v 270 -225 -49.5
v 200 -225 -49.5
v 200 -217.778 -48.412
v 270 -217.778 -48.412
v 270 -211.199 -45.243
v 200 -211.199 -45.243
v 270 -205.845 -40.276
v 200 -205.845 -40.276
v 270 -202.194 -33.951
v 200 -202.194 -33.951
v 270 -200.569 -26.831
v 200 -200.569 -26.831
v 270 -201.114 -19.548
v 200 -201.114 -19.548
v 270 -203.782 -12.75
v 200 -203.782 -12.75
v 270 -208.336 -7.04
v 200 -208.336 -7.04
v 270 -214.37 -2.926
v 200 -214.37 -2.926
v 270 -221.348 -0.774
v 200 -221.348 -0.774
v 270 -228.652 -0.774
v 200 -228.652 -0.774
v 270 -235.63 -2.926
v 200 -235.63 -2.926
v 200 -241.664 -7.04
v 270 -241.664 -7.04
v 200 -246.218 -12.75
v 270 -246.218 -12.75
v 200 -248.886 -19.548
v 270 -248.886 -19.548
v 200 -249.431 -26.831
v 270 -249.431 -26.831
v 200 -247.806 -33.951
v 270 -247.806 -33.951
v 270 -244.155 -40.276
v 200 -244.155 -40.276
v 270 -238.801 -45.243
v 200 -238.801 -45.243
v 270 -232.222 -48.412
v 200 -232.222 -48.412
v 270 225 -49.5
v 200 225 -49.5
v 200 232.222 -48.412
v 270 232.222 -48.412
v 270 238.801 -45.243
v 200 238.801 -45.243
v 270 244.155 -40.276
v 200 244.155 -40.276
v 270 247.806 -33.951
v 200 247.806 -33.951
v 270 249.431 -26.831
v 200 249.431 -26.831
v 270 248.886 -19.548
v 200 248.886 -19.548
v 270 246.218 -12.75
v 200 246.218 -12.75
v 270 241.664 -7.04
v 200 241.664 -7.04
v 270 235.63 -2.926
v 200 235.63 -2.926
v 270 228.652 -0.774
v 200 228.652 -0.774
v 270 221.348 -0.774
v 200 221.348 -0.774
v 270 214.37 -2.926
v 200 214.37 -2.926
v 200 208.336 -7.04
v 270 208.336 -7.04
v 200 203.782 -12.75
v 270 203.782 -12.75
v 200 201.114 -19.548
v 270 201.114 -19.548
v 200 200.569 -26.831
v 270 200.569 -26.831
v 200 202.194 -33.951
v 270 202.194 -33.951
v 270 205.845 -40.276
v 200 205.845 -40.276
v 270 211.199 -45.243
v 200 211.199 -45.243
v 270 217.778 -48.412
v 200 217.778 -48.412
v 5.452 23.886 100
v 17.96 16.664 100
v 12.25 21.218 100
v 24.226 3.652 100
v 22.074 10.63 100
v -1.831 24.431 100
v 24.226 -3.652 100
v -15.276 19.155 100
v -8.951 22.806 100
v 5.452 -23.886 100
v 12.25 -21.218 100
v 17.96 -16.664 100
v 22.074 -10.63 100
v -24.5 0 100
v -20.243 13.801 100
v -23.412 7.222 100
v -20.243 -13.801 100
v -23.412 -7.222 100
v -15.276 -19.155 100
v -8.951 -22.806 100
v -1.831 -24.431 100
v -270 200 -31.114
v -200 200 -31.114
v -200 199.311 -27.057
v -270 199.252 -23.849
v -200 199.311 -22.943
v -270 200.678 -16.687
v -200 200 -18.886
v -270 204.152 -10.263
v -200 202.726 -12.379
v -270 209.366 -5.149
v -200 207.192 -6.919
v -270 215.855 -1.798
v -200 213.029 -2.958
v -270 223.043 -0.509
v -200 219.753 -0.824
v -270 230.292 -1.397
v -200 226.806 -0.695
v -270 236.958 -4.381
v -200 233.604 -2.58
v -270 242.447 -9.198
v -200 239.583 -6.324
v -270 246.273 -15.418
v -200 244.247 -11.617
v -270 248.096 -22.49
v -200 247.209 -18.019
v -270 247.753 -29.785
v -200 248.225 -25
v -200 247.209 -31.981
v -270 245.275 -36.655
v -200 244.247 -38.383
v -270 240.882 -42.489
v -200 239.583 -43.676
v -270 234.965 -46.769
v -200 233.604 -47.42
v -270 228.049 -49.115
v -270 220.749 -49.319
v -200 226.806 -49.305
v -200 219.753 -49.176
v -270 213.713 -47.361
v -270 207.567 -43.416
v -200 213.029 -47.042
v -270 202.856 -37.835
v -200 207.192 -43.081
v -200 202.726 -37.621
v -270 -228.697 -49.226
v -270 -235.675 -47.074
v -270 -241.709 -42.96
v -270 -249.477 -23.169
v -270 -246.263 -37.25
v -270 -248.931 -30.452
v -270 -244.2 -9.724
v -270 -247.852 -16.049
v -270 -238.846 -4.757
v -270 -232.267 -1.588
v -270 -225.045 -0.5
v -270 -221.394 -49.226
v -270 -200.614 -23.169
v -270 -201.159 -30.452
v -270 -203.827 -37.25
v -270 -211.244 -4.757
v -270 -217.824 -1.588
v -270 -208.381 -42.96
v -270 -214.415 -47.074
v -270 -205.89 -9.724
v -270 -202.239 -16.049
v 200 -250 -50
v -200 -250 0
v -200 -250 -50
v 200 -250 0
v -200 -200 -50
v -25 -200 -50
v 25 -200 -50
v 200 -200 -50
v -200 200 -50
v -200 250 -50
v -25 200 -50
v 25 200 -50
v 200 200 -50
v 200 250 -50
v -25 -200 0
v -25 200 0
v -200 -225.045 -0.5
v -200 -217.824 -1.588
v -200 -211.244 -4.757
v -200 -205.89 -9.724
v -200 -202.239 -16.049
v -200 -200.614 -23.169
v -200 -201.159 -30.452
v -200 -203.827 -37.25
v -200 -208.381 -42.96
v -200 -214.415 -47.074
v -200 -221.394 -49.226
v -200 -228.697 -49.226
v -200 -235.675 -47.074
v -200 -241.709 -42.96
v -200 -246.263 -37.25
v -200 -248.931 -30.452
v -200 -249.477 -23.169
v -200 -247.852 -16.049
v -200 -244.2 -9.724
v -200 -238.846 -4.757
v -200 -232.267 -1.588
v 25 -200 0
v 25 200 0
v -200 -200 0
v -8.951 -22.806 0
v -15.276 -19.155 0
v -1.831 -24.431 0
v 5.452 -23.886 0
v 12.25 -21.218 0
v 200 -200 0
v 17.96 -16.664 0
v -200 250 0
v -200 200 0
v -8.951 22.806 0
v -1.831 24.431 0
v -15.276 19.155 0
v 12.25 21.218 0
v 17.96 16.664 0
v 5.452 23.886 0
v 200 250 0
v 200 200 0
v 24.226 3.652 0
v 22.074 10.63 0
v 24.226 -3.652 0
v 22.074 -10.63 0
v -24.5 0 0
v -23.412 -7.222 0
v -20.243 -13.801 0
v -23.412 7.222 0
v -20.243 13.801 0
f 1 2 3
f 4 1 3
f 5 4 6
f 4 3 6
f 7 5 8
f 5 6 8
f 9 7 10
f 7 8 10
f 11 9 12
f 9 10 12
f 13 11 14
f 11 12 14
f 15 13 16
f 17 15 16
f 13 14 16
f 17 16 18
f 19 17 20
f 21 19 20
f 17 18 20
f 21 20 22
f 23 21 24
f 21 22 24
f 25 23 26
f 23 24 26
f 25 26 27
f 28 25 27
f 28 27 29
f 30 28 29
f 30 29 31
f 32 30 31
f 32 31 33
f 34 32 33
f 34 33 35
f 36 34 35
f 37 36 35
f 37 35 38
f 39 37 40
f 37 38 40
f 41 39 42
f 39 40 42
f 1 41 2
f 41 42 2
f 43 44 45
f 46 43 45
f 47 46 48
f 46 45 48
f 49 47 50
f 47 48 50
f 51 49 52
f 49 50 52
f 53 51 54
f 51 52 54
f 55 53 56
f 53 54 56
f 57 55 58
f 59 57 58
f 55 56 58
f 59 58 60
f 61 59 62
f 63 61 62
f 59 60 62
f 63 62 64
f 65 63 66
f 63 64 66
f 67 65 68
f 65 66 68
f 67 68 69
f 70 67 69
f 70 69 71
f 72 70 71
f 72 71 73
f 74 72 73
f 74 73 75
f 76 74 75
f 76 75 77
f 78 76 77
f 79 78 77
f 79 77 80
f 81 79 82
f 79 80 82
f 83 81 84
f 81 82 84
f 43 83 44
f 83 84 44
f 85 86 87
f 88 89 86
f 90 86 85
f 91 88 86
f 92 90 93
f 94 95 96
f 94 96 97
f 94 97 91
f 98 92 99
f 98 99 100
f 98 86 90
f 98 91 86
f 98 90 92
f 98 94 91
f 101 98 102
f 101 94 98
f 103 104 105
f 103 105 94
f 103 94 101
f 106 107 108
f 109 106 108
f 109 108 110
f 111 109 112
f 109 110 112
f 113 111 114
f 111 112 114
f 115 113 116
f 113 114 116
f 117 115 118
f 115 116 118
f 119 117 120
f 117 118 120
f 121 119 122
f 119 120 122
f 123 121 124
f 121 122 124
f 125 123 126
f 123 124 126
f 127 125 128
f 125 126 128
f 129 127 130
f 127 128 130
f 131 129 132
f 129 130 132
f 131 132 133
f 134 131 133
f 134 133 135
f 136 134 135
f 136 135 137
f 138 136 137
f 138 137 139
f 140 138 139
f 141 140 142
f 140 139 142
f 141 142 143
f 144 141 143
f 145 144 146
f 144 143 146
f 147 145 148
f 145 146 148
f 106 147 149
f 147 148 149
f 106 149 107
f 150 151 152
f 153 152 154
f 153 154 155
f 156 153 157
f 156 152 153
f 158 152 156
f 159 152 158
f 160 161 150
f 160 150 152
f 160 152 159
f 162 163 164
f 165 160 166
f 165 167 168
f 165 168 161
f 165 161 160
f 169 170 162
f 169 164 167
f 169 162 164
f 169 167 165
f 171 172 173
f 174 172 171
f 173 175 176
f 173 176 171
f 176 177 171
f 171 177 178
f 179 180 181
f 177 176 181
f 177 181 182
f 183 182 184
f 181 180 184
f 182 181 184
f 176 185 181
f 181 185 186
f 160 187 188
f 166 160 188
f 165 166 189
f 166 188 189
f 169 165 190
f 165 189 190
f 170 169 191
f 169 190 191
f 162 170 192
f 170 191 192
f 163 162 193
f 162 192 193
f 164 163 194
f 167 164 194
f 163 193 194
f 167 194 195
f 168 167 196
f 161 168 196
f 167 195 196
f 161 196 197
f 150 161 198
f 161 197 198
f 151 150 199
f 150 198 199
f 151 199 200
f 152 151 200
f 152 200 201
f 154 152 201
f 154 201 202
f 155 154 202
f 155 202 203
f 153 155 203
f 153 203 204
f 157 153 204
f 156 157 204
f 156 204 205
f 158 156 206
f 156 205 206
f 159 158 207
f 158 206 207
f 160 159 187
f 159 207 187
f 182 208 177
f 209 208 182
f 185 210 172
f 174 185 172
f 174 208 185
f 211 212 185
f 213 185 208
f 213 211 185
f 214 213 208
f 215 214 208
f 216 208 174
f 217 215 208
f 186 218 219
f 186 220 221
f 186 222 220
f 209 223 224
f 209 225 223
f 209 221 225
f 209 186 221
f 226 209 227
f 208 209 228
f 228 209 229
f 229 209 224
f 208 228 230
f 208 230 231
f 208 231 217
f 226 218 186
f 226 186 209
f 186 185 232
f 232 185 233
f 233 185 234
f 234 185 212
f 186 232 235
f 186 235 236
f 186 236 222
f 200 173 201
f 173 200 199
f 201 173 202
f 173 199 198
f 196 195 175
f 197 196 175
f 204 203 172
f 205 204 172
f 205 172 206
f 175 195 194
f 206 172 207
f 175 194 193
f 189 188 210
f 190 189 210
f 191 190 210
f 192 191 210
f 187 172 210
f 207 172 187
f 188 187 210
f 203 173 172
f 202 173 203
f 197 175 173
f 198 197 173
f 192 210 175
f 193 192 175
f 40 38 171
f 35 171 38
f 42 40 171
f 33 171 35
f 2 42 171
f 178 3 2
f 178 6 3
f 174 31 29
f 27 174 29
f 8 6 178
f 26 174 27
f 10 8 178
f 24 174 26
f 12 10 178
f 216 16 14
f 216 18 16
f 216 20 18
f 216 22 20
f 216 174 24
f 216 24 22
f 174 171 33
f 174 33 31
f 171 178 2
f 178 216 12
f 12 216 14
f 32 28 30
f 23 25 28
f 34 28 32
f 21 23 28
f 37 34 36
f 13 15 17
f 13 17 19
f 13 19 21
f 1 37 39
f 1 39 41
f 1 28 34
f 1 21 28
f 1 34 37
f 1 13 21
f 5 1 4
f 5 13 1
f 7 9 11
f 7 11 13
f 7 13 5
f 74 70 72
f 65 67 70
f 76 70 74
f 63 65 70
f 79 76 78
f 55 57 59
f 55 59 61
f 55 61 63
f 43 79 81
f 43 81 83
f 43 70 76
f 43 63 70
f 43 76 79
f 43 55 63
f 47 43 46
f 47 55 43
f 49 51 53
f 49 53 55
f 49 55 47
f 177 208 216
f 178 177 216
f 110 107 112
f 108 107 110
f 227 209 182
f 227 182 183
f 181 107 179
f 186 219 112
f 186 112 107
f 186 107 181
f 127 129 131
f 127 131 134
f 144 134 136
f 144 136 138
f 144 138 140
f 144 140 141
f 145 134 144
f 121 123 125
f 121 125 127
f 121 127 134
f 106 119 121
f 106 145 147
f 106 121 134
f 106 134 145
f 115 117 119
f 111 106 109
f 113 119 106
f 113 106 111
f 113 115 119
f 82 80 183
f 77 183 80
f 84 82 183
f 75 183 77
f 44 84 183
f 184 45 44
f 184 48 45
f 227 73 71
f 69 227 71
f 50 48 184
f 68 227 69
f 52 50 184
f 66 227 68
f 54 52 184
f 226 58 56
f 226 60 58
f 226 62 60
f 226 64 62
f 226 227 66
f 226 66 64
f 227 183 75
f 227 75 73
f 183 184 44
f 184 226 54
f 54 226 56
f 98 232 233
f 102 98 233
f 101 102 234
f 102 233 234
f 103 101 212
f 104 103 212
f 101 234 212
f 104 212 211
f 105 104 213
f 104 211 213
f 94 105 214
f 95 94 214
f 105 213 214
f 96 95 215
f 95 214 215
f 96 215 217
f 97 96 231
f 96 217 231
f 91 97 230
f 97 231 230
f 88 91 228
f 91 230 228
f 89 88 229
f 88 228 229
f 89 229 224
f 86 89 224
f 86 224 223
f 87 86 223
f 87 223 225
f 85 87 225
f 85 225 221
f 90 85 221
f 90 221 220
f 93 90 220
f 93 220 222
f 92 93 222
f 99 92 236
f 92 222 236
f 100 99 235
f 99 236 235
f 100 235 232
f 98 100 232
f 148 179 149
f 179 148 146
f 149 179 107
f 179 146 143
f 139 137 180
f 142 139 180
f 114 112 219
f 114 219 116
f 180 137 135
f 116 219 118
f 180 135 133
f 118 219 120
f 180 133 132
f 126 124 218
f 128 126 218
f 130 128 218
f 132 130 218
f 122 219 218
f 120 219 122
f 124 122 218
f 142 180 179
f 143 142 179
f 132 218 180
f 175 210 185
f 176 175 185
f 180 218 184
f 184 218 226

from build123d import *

# Parameters (mm, degrees)
CROQUIS2_W               = 400
CROQUIS2_H               = 500
SALIENTE_EXTRUIR3_DEPTH  = 50
CROQUIS7_W               = 175
CROQUIS7_H               = 400
CORTAR_EXTRUIR2_DEPTH    = 50
CROQUIS9_R               = 24.5
SALIENTE_EXTRUIR5_DEPTH  = 70
CROQUIS10_R              = 24.5
SALIENTE_EXTRUIR6_DEPTH  = 70
CROQUIS19_R              = 24.5
SALIENTE_EXTRUIR10_DEPTH = 70
CROQUIS20_R              = 24.5
SALIENTE_EXTRUIR11_DEPTH = 70
CROQUIS12_R              = 24.5
SALIENTE_EXTRUIR12_DEPTH = 100


with BuildPart() as part:
    # Croquis2 → Saliente-Extruir3 (new body)
    with BuildSketch(Plane.XY):
        Rectangle(CROQUIS2_W, CROQUIS2_H)
    extrude(amount=-SALIENTE_EXTRUIR3_DEPTH)

    # Croquis7 → Cortar-Extruir2 (cut)
    with BuildSketch(Plane.XY):
        with Locations((-112.5, 0)):
            Rectangle(CROQUIS7_W, CROQUIS7_H)
        with Locations((112.5, 0)):
            Rectangle(CROQUIS7_W, CROQUIS7_H)
    extrude(amount=-CORTAR_EXTRUIR2_DEPTH, mode=Mode.SUBTRACT)

    # Croquis9 → Saliente-Extruir5 (add)
    with BuildSketch(Plane.ZY.offset(200)):
        with Locations((-25, -225.045105614)):
            Circle(CROQUIS9_R)
    extrude(amount=SALIENTE_EXTRUIR5_DEPTH)

    # Croquis10 → Saliente-Extruir6 (add)
    with BuildSketch(Plane.ZY.offset(200)):
        with Locations(Location((-25, 223.724834231, 0), (0, 0, 255.54880869))):
            Circle(CROQUIS10_R)
    extrude(amount=SALIENTE_EXTRUIR6_DEPTH)

    # Croquis19 → Saliente-Extruir10 (add)
    with BuildSketch(Plane(origin=(200, 0, 0), x_dir=(0, 0, -1), z_dir=(1, 0, 0))):
        with Locations((25, -225)):
            Circle(CROQUIS19_R)
    extrude(amount=SALIENTE_EXTRUIR10_DEPTH)

    # Croquis20 → Saliente-Extruir11 (add)
    with BuildSketch(Plane(origin=(200, 0, 0), x_dir=(0, 0, -1), z_dir=(1, 0, 0))):
        with Locations((25, 225)):
            Circle(CROQUIS20_R)
    extrude(amount=SALIENTE_EXTRUIR11_DEPTH)

    # Croquis12 → Saliente-Extruir12 (add)
    with BuildSketch(Plane.XY):
        with Locations(Location((0, 0, 0), (0, 0, 180))):
            Circle(CROQUIS12_R)
    extrude(amount=SALIENTE_EXTRUIR12_DEPTH)


solid = part.part
